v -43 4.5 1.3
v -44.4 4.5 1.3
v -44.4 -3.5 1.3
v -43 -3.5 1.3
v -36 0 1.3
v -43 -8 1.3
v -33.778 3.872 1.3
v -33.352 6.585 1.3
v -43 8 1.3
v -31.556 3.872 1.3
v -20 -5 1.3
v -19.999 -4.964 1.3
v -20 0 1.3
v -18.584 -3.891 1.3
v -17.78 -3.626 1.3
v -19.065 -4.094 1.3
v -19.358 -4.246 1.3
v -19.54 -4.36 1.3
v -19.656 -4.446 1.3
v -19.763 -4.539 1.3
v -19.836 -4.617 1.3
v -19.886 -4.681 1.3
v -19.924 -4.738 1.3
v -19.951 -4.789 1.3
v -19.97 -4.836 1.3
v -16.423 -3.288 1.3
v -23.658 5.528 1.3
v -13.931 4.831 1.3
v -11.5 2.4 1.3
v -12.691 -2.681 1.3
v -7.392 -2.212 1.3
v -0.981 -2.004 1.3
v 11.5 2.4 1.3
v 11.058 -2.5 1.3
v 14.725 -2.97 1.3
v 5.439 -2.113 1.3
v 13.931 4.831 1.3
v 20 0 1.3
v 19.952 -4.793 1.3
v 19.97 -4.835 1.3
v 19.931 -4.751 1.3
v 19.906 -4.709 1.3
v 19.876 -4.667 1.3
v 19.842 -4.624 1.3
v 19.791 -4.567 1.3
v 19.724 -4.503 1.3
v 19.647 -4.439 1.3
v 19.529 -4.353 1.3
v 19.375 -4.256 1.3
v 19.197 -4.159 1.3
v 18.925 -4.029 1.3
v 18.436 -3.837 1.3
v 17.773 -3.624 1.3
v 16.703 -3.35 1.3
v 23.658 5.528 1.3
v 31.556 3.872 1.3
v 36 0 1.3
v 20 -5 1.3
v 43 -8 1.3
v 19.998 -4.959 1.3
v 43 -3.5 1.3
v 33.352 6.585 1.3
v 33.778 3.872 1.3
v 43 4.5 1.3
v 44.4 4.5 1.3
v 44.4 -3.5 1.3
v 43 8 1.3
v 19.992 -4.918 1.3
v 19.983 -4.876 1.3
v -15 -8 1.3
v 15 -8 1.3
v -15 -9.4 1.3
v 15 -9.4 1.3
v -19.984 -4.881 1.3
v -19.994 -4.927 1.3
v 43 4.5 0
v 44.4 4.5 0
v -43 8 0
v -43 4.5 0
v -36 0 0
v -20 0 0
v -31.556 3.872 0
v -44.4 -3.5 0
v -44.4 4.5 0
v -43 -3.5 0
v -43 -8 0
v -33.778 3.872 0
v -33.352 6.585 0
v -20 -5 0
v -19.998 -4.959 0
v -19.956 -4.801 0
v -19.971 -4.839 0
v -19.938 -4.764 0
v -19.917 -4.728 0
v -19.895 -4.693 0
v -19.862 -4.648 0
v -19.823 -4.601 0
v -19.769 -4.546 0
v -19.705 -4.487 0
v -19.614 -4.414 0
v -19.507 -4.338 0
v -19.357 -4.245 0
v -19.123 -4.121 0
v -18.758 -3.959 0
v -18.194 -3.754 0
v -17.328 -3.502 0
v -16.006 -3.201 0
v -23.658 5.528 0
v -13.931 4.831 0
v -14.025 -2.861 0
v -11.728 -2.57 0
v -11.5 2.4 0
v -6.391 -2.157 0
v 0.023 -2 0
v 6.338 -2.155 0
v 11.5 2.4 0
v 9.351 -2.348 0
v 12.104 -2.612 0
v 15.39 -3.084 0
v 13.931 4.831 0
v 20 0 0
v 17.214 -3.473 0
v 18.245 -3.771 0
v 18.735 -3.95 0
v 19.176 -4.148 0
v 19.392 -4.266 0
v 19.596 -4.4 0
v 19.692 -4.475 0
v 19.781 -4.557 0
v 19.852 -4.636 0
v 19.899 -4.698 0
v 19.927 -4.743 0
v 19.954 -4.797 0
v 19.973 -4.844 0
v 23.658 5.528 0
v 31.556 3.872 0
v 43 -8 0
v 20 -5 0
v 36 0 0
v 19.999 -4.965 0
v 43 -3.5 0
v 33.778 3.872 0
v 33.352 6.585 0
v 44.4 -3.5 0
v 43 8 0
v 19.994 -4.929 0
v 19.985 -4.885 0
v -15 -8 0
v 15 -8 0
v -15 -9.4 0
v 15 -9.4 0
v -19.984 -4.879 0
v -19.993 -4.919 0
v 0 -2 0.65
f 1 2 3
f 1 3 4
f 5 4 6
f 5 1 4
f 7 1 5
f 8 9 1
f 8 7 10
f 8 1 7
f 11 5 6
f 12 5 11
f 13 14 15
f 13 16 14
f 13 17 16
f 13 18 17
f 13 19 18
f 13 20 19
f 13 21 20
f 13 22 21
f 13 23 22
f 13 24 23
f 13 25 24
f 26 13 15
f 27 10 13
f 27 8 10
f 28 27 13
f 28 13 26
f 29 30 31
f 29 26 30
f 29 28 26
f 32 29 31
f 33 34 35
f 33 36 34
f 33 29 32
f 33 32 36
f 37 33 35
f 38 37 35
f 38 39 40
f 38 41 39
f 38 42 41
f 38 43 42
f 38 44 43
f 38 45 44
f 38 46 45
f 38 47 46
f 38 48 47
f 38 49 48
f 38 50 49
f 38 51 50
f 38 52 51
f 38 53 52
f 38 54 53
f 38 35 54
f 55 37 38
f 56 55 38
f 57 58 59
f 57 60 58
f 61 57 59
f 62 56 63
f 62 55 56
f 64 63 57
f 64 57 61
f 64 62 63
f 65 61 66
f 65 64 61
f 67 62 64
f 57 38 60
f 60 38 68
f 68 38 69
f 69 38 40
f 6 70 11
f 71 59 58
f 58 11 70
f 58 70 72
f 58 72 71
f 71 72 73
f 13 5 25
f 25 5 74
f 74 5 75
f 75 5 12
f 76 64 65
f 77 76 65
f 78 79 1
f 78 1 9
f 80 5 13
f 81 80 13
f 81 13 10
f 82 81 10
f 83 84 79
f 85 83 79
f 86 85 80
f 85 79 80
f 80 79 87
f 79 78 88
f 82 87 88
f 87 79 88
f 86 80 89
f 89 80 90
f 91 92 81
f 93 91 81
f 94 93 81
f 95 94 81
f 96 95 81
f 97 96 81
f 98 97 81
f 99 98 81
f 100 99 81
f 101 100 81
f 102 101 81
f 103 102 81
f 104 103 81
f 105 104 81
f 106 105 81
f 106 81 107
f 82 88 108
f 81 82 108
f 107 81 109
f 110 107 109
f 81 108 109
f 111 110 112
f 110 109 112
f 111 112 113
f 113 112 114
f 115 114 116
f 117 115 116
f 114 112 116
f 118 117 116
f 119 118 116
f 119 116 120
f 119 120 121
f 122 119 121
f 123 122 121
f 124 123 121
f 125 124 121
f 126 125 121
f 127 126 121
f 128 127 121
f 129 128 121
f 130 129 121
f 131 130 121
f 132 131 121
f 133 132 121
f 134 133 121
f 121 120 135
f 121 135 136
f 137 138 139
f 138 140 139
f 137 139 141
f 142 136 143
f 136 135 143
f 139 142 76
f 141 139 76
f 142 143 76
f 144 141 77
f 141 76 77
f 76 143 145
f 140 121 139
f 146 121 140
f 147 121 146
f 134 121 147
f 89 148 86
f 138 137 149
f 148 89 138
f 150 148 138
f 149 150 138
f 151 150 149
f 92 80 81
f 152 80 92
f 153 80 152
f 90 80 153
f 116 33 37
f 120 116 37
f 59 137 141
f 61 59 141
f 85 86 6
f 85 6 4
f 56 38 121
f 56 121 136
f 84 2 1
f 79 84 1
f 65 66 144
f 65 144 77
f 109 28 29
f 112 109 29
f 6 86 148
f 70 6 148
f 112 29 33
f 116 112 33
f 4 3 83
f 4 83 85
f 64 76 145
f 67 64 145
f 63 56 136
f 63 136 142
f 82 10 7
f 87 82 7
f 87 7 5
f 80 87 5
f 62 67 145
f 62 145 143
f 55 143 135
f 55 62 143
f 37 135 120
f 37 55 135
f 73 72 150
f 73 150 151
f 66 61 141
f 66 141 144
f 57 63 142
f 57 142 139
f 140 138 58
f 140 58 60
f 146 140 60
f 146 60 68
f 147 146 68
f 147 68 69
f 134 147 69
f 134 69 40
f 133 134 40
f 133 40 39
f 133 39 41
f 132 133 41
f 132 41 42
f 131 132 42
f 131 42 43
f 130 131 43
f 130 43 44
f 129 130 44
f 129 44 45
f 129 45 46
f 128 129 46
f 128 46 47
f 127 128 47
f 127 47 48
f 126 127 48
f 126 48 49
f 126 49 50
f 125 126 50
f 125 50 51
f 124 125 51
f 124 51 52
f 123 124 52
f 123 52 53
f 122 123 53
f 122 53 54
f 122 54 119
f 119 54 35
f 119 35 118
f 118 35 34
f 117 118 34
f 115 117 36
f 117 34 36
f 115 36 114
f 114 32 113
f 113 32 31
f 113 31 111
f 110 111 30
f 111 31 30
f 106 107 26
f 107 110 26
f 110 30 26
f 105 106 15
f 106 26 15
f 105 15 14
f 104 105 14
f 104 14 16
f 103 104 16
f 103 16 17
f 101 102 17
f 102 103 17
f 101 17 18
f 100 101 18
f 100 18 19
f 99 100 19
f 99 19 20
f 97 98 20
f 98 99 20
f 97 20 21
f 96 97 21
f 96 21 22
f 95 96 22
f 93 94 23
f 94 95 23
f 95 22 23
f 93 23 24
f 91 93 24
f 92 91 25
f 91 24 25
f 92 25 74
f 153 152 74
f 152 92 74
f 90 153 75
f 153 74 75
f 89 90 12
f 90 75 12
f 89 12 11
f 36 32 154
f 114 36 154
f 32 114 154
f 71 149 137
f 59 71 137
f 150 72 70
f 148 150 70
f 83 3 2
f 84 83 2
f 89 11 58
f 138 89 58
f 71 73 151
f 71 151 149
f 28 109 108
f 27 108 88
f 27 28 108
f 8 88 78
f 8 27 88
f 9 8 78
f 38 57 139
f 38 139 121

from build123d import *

# Parameters (mm, degrees)
SKETCH1_W           = 86
SKETCH1_H           = 16
BOSS_EXTRUDE1_DEPTH = 1.3
SKETCH2_W           = 1.4
SKETCH2_H           = 8
SKETCH2_W_2         = 30
SKETCH2_H_2         = 1.4
BOSS_EXTRUDE2_DEPTH = 1.3
CUT_EXTRUDE1_DEPTH  = 46.40275322
CUT_EXTRUDE2_DEPTH  = 46.40275322


with BuildPart() as part:
    # Sketch1 → Boss-Extrude1 (new body)
    with BuildSketch(Plane.XY):
        Rectangle(SKETCH1_W, SKETCH1_H)
    extrude(amount=BOSS_EXTRUDE1_DEPTH)

    # Sketch2 → Boss-Extrude2 (add)
    with BuildSketch(Plane.XY.offset(1.3)):
        with Locations((-43.7, 0.5)):
            Rectangle(SKETCH2_W, SKETCH2_H)
        with Locations((43.7, 0.5)):
            Rectangle(SKETCH2_W, SKETCH2_H)
        with Locations((0, -8.7)):
            Rectangle(SKETCH2_W_2, SKETCH2_H_2)
    extrude(amount=-BOSS_EXTRUDE2_DEPTH)

    # Sketch3 → Cut-Extrude1 (cut, through all)
    with BuildSketch(Plane.XY.offset(1.3)):
        with BuildLine():
            Line((-43, 8), (43, 8))
            ThreePointArc((43, 8), (0, 4.461913504), (-43, 8))
        make_face()
        Polygon((-20, 0), (-31.555732492, 3.872025984), (-33.777866246, 3.872025984), (-36, 0), align=None)
        Polygon((36, 0), (20, 0), (31.555732492, 3.872025984), (33.777866246, 3.872025984), align=None)
    extrude(amount=-CUT_EXTRUDE1_DEPTH, mode=Mode.SUBTRACT)

    # Sketch4 → Cut-Extrude2 (cut, through all)
    with BuildSketch(Plane.XY.offset(1.3)):
        Polygon((-13.931038069, 4.831038069), (-11.5, 2.4), (11.5, 2.4), (13.931038069, 4.831038069), align=None)
        with BuildLine():
            Line((-20, -5), (20, -5))
            add(Edge.make_bspline(
                [(20, -5), (20, -2), (0, -2), (-20, -2), (-20, -5)],
                knots=[0, 0, 0, 1.570796327, 1.570796327, 3.141592654, 3.141592654, 3.141592654], degree=2, weights=[1, 0.707106781, 1, 0.707106781, 1]))
        make_face()
    extrude(amount=-CUT_EXTRUDE2_DEPTH, mode=Mode.SUBTRACT)


solid = part.part
